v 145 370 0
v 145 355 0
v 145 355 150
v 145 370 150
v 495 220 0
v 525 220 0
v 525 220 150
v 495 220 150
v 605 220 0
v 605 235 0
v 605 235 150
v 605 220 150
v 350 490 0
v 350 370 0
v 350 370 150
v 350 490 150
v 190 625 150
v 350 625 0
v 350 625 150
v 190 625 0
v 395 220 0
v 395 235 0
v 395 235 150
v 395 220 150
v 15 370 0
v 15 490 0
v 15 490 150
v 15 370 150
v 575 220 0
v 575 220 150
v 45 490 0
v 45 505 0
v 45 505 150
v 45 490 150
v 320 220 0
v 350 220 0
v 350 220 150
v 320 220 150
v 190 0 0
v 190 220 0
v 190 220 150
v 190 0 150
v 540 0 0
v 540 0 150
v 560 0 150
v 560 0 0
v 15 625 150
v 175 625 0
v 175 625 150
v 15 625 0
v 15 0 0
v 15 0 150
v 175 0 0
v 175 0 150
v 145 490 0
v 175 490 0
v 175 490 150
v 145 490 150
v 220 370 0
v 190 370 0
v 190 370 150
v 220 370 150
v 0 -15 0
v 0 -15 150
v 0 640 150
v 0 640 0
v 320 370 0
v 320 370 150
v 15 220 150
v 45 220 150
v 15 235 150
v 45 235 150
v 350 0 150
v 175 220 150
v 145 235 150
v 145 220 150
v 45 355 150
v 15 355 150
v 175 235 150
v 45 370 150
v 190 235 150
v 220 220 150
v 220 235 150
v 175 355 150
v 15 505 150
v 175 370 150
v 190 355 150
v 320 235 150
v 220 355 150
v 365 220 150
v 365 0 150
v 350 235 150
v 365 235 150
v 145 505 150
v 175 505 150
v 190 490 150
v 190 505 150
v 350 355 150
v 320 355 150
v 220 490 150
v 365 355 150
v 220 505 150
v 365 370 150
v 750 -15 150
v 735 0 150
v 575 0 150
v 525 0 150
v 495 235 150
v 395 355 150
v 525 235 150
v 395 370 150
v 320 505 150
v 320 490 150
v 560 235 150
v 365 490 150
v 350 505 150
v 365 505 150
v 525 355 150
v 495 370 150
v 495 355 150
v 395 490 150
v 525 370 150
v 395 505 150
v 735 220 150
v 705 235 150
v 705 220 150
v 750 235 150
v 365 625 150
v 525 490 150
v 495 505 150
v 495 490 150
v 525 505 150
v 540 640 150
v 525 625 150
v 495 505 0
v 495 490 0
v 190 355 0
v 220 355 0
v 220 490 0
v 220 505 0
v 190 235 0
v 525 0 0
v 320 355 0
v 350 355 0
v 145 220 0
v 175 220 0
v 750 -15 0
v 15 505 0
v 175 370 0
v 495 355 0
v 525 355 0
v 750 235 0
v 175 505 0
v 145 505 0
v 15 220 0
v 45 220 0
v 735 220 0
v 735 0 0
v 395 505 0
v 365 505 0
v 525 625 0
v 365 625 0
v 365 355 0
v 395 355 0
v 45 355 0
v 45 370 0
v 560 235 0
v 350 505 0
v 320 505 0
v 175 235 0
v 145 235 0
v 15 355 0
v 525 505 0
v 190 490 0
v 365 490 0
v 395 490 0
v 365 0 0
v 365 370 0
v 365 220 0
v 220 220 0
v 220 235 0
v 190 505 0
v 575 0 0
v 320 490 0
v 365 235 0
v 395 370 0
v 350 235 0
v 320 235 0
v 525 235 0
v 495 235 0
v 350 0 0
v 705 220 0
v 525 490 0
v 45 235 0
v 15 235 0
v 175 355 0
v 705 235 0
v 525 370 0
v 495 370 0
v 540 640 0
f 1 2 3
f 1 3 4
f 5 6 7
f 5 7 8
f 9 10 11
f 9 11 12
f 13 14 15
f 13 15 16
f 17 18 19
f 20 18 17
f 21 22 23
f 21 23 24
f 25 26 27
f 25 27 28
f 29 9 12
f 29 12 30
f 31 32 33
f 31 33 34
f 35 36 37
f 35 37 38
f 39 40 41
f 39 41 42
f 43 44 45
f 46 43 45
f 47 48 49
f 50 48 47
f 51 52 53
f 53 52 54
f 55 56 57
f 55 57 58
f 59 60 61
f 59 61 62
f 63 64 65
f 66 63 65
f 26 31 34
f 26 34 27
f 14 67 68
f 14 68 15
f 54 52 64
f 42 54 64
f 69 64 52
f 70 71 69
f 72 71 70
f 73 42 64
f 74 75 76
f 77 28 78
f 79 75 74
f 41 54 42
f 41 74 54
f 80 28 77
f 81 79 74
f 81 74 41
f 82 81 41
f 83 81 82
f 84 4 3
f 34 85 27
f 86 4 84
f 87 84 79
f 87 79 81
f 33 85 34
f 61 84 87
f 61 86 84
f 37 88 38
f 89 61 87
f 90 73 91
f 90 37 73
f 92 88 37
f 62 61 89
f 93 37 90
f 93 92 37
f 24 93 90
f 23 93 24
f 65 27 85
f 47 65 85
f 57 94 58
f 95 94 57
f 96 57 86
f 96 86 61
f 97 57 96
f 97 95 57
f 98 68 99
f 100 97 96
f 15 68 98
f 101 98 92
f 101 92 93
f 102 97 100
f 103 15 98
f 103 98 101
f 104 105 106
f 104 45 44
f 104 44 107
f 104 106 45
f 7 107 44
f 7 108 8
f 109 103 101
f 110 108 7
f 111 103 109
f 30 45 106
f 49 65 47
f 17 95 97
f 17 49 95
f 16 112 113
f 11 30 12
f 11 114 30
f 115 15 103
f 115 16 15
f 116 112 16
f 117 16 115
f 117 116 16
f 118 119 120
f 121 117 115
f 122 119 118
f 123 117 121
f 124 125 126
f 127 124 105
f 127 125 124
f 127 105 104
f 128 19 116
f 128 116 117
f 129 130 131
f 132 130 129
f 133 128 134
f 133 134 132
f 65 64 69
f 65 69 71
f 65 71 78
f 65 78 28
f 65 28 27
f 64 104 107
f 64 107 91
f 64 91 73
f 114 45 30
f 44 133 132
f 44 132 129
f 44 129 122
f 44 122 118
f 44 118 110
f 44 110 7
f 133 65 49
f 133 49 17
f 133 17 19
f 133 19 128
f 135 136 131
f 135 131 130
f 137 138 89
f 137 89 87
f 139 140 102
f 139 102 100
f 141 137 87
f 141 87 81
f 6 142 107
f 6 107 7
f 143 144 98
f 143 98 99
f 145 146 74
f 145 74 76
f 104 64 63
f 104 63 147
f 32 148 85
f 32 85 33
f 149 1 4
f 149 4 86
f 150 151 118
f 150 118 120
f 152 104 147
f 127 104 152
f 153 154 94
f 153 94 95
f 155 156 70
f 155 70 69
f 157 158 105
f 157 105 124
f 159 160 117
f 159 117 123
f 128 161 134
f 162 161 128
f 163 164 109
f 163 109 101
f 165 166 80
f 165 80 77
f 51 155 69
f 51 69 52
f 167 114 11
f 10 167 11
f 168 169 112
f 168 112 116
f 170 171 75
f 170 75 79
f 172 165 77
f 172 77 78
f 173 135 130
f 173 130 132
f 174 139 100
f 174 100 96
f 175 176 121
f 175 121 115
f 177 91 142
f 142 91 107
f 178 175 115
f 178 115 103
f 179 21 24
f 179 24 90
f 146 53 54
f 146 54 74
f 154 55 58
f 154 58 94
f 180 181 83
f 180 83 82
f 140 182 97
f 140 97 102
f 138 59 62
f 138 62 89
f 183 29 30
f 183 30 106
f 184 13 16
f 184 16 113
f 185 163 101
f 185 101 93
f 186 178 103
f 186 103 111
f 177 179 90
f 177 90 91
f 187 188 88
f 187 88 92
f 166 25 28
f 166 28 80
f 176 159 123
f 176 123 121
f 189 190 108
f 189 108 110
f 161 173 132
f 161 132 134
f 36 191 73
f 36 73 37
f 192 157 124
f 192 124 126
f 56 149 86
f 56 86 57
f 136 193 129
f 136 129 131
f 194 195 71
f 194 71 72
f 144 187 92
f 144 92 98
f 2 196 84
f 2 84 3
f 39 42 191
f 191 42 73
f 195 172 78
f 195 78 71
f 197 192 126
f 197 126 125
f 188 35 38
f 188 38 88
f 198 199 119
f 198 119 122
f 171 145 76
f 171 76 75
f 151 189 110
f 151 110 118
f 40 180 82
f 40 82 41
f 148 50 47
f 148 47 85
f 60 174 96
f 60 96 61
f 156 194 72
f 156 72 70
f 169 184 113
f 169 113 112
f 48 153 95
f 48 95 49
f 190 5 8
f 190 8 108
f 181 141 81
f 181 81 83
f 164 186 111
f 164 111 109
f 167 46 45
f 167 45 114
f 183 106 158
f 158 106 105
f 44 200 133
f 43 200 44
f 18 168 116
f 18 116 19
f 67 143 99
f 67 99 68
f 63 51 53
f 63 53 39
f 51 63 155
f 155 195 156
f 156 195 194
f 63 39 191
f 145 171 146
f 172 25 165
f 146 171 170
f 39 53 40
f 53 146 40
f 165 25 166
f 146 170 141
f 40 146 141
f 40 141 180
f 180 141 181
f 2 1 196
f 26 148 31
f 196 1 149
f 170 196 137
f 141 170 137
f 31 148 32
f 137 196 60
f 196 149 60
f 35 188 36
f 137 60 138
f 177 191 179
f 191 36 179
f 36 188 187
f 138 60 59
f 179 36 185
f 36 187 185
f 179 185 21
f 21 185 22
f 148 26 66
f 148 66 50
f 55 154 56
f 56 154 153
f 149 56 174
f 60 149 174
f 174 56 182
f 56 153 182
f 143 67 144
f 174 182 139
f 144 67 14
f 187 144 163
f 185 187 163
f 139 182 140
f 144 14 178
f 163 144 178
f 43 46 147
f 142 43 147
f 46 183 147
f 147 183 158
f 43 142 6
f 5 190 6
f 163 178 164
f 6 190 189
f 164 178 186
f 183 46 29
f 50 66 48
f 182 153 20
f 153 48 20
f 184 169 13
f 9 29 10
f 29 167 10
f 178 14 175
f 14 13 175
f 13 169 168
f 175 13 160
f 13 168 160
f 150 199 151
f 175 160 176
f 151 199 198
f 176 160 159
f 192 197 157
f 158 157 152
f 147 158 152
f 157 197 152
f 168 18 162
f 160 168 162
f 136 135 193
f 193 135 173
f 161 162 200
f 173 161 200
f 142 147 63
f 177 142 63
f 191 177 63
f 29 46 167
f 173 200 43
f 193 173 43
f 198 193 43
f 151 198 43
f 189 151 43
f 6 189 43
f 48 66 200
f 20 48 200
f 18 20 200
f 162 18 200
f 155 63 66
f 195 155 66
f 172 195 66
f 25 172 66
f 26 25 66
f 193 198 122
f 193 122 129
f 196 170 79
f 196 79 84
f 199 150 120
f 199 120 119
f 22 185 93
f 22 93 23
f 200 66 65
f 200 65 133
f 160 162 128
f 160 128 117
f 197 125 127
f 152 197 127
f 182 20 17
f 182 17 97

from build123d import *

# Parameters (mm, degrees)
BOSS_EXTRUDE1_DEPTH   = 150
BOSS_EXTRUDE2_DEPTH   = 150
BOSS_EXTRUDE2_2_DEPTH = 150
SKETCH3_W             = 750
SKETCH3_H             = 15
BOSS_EXTRUDE3_DEPTH   = 150


with BuildPart() as part:
    # Sketch1 → Boss-Extrude1 (new body)
    with BuildSketch(Plane.XY):
        Polygon((0, 640), (540, 640), (540, 0), (525, 0), (525, 220), (495, 220), (495, 235), (525, 235), (525, 355), (495, 355), (495, 370), (525, 370), (525, 490), (495, 490), (495, 505), (525, 505), (525, 625), (365, 625), (365, 505), (395, 505), (395, 490), (365, 490), (365, 370), (395, 370), (395, 355), (365, 355), (365, 235), (395, 235), (395, 220), (365, 220), (365, 0), (350, 0), (350, 220), (320, 220), (320, 235), (350, 235), (350, 355), (320, 355), (320, 370), (350, 370), (350, 490), (320, 490), (320, 505), (350, 505), (350, 625), (190, 625), (190, 505), (220, 505), (220, 490), (190, 490), (190, 370), (220, 370), (220, 355), (190, 355), (190, 235), (220, 235), (220, 220), (190, 220), (190, 0), (175, 0), (175, 220), (145, 220), (145, 235), (175, 235), (175, 355), (145, 355), (145, 370), (175, 370), (175, 490), (145, 490), (145, 505), (175, 505), (175, 625), (15, 625), (15, 505), (45, 505), (45, 490), (15, 490), (15, 370), (45, 370), (45, 355), (15, 355), (15, 235), (45, 235), (45, 220), (15, 220), (15, 0), (0, 0), align=None)
    extrude(amount=BOSS_EXTRUDE1_DEPTH)



with BuildPart() as body_2:
    # Sketch2 → Boss-Extrude2 (new body)
    with BuildSketch(Plane.XY):
        Polygon((560, 235), (605, 235), (605, 220), (575, 220), (575, 0), (560, 0), align=None)
    extrude(amount=BOSS_EXTRUDE2_DEPTH)


with BuildPart() as body_3:
    # Sketch2 → Boss-Extrude2 2 (new body)
    with BuildSketch(Plane.XY):
        Polygon((735, 0), (735, 220), (705, 220), (705, 235), (750, 235), (750, 0), align=None)
    extrude(amount=BOSS_EXTRUDE2_2_DEPTH)


with BuildPart() as part_1:
    add(part.part)

    add(body_2.part)  # Boss-Extrude3 merges body 2

    add(body_3.part)  # Boss-Extrude3 merges body 3
    # Sketch3 → Boss-Extrude3 (add)
    with BuildSketch(Plane.XY.offset(150)):
        with Locations((375, -7.5)):
            Rectangle(SKETCH3_W, SKETCH3_H)
    extrude(amount=-BOSS_EXTRUDE3_DEPTH)


solid = part_1.part
